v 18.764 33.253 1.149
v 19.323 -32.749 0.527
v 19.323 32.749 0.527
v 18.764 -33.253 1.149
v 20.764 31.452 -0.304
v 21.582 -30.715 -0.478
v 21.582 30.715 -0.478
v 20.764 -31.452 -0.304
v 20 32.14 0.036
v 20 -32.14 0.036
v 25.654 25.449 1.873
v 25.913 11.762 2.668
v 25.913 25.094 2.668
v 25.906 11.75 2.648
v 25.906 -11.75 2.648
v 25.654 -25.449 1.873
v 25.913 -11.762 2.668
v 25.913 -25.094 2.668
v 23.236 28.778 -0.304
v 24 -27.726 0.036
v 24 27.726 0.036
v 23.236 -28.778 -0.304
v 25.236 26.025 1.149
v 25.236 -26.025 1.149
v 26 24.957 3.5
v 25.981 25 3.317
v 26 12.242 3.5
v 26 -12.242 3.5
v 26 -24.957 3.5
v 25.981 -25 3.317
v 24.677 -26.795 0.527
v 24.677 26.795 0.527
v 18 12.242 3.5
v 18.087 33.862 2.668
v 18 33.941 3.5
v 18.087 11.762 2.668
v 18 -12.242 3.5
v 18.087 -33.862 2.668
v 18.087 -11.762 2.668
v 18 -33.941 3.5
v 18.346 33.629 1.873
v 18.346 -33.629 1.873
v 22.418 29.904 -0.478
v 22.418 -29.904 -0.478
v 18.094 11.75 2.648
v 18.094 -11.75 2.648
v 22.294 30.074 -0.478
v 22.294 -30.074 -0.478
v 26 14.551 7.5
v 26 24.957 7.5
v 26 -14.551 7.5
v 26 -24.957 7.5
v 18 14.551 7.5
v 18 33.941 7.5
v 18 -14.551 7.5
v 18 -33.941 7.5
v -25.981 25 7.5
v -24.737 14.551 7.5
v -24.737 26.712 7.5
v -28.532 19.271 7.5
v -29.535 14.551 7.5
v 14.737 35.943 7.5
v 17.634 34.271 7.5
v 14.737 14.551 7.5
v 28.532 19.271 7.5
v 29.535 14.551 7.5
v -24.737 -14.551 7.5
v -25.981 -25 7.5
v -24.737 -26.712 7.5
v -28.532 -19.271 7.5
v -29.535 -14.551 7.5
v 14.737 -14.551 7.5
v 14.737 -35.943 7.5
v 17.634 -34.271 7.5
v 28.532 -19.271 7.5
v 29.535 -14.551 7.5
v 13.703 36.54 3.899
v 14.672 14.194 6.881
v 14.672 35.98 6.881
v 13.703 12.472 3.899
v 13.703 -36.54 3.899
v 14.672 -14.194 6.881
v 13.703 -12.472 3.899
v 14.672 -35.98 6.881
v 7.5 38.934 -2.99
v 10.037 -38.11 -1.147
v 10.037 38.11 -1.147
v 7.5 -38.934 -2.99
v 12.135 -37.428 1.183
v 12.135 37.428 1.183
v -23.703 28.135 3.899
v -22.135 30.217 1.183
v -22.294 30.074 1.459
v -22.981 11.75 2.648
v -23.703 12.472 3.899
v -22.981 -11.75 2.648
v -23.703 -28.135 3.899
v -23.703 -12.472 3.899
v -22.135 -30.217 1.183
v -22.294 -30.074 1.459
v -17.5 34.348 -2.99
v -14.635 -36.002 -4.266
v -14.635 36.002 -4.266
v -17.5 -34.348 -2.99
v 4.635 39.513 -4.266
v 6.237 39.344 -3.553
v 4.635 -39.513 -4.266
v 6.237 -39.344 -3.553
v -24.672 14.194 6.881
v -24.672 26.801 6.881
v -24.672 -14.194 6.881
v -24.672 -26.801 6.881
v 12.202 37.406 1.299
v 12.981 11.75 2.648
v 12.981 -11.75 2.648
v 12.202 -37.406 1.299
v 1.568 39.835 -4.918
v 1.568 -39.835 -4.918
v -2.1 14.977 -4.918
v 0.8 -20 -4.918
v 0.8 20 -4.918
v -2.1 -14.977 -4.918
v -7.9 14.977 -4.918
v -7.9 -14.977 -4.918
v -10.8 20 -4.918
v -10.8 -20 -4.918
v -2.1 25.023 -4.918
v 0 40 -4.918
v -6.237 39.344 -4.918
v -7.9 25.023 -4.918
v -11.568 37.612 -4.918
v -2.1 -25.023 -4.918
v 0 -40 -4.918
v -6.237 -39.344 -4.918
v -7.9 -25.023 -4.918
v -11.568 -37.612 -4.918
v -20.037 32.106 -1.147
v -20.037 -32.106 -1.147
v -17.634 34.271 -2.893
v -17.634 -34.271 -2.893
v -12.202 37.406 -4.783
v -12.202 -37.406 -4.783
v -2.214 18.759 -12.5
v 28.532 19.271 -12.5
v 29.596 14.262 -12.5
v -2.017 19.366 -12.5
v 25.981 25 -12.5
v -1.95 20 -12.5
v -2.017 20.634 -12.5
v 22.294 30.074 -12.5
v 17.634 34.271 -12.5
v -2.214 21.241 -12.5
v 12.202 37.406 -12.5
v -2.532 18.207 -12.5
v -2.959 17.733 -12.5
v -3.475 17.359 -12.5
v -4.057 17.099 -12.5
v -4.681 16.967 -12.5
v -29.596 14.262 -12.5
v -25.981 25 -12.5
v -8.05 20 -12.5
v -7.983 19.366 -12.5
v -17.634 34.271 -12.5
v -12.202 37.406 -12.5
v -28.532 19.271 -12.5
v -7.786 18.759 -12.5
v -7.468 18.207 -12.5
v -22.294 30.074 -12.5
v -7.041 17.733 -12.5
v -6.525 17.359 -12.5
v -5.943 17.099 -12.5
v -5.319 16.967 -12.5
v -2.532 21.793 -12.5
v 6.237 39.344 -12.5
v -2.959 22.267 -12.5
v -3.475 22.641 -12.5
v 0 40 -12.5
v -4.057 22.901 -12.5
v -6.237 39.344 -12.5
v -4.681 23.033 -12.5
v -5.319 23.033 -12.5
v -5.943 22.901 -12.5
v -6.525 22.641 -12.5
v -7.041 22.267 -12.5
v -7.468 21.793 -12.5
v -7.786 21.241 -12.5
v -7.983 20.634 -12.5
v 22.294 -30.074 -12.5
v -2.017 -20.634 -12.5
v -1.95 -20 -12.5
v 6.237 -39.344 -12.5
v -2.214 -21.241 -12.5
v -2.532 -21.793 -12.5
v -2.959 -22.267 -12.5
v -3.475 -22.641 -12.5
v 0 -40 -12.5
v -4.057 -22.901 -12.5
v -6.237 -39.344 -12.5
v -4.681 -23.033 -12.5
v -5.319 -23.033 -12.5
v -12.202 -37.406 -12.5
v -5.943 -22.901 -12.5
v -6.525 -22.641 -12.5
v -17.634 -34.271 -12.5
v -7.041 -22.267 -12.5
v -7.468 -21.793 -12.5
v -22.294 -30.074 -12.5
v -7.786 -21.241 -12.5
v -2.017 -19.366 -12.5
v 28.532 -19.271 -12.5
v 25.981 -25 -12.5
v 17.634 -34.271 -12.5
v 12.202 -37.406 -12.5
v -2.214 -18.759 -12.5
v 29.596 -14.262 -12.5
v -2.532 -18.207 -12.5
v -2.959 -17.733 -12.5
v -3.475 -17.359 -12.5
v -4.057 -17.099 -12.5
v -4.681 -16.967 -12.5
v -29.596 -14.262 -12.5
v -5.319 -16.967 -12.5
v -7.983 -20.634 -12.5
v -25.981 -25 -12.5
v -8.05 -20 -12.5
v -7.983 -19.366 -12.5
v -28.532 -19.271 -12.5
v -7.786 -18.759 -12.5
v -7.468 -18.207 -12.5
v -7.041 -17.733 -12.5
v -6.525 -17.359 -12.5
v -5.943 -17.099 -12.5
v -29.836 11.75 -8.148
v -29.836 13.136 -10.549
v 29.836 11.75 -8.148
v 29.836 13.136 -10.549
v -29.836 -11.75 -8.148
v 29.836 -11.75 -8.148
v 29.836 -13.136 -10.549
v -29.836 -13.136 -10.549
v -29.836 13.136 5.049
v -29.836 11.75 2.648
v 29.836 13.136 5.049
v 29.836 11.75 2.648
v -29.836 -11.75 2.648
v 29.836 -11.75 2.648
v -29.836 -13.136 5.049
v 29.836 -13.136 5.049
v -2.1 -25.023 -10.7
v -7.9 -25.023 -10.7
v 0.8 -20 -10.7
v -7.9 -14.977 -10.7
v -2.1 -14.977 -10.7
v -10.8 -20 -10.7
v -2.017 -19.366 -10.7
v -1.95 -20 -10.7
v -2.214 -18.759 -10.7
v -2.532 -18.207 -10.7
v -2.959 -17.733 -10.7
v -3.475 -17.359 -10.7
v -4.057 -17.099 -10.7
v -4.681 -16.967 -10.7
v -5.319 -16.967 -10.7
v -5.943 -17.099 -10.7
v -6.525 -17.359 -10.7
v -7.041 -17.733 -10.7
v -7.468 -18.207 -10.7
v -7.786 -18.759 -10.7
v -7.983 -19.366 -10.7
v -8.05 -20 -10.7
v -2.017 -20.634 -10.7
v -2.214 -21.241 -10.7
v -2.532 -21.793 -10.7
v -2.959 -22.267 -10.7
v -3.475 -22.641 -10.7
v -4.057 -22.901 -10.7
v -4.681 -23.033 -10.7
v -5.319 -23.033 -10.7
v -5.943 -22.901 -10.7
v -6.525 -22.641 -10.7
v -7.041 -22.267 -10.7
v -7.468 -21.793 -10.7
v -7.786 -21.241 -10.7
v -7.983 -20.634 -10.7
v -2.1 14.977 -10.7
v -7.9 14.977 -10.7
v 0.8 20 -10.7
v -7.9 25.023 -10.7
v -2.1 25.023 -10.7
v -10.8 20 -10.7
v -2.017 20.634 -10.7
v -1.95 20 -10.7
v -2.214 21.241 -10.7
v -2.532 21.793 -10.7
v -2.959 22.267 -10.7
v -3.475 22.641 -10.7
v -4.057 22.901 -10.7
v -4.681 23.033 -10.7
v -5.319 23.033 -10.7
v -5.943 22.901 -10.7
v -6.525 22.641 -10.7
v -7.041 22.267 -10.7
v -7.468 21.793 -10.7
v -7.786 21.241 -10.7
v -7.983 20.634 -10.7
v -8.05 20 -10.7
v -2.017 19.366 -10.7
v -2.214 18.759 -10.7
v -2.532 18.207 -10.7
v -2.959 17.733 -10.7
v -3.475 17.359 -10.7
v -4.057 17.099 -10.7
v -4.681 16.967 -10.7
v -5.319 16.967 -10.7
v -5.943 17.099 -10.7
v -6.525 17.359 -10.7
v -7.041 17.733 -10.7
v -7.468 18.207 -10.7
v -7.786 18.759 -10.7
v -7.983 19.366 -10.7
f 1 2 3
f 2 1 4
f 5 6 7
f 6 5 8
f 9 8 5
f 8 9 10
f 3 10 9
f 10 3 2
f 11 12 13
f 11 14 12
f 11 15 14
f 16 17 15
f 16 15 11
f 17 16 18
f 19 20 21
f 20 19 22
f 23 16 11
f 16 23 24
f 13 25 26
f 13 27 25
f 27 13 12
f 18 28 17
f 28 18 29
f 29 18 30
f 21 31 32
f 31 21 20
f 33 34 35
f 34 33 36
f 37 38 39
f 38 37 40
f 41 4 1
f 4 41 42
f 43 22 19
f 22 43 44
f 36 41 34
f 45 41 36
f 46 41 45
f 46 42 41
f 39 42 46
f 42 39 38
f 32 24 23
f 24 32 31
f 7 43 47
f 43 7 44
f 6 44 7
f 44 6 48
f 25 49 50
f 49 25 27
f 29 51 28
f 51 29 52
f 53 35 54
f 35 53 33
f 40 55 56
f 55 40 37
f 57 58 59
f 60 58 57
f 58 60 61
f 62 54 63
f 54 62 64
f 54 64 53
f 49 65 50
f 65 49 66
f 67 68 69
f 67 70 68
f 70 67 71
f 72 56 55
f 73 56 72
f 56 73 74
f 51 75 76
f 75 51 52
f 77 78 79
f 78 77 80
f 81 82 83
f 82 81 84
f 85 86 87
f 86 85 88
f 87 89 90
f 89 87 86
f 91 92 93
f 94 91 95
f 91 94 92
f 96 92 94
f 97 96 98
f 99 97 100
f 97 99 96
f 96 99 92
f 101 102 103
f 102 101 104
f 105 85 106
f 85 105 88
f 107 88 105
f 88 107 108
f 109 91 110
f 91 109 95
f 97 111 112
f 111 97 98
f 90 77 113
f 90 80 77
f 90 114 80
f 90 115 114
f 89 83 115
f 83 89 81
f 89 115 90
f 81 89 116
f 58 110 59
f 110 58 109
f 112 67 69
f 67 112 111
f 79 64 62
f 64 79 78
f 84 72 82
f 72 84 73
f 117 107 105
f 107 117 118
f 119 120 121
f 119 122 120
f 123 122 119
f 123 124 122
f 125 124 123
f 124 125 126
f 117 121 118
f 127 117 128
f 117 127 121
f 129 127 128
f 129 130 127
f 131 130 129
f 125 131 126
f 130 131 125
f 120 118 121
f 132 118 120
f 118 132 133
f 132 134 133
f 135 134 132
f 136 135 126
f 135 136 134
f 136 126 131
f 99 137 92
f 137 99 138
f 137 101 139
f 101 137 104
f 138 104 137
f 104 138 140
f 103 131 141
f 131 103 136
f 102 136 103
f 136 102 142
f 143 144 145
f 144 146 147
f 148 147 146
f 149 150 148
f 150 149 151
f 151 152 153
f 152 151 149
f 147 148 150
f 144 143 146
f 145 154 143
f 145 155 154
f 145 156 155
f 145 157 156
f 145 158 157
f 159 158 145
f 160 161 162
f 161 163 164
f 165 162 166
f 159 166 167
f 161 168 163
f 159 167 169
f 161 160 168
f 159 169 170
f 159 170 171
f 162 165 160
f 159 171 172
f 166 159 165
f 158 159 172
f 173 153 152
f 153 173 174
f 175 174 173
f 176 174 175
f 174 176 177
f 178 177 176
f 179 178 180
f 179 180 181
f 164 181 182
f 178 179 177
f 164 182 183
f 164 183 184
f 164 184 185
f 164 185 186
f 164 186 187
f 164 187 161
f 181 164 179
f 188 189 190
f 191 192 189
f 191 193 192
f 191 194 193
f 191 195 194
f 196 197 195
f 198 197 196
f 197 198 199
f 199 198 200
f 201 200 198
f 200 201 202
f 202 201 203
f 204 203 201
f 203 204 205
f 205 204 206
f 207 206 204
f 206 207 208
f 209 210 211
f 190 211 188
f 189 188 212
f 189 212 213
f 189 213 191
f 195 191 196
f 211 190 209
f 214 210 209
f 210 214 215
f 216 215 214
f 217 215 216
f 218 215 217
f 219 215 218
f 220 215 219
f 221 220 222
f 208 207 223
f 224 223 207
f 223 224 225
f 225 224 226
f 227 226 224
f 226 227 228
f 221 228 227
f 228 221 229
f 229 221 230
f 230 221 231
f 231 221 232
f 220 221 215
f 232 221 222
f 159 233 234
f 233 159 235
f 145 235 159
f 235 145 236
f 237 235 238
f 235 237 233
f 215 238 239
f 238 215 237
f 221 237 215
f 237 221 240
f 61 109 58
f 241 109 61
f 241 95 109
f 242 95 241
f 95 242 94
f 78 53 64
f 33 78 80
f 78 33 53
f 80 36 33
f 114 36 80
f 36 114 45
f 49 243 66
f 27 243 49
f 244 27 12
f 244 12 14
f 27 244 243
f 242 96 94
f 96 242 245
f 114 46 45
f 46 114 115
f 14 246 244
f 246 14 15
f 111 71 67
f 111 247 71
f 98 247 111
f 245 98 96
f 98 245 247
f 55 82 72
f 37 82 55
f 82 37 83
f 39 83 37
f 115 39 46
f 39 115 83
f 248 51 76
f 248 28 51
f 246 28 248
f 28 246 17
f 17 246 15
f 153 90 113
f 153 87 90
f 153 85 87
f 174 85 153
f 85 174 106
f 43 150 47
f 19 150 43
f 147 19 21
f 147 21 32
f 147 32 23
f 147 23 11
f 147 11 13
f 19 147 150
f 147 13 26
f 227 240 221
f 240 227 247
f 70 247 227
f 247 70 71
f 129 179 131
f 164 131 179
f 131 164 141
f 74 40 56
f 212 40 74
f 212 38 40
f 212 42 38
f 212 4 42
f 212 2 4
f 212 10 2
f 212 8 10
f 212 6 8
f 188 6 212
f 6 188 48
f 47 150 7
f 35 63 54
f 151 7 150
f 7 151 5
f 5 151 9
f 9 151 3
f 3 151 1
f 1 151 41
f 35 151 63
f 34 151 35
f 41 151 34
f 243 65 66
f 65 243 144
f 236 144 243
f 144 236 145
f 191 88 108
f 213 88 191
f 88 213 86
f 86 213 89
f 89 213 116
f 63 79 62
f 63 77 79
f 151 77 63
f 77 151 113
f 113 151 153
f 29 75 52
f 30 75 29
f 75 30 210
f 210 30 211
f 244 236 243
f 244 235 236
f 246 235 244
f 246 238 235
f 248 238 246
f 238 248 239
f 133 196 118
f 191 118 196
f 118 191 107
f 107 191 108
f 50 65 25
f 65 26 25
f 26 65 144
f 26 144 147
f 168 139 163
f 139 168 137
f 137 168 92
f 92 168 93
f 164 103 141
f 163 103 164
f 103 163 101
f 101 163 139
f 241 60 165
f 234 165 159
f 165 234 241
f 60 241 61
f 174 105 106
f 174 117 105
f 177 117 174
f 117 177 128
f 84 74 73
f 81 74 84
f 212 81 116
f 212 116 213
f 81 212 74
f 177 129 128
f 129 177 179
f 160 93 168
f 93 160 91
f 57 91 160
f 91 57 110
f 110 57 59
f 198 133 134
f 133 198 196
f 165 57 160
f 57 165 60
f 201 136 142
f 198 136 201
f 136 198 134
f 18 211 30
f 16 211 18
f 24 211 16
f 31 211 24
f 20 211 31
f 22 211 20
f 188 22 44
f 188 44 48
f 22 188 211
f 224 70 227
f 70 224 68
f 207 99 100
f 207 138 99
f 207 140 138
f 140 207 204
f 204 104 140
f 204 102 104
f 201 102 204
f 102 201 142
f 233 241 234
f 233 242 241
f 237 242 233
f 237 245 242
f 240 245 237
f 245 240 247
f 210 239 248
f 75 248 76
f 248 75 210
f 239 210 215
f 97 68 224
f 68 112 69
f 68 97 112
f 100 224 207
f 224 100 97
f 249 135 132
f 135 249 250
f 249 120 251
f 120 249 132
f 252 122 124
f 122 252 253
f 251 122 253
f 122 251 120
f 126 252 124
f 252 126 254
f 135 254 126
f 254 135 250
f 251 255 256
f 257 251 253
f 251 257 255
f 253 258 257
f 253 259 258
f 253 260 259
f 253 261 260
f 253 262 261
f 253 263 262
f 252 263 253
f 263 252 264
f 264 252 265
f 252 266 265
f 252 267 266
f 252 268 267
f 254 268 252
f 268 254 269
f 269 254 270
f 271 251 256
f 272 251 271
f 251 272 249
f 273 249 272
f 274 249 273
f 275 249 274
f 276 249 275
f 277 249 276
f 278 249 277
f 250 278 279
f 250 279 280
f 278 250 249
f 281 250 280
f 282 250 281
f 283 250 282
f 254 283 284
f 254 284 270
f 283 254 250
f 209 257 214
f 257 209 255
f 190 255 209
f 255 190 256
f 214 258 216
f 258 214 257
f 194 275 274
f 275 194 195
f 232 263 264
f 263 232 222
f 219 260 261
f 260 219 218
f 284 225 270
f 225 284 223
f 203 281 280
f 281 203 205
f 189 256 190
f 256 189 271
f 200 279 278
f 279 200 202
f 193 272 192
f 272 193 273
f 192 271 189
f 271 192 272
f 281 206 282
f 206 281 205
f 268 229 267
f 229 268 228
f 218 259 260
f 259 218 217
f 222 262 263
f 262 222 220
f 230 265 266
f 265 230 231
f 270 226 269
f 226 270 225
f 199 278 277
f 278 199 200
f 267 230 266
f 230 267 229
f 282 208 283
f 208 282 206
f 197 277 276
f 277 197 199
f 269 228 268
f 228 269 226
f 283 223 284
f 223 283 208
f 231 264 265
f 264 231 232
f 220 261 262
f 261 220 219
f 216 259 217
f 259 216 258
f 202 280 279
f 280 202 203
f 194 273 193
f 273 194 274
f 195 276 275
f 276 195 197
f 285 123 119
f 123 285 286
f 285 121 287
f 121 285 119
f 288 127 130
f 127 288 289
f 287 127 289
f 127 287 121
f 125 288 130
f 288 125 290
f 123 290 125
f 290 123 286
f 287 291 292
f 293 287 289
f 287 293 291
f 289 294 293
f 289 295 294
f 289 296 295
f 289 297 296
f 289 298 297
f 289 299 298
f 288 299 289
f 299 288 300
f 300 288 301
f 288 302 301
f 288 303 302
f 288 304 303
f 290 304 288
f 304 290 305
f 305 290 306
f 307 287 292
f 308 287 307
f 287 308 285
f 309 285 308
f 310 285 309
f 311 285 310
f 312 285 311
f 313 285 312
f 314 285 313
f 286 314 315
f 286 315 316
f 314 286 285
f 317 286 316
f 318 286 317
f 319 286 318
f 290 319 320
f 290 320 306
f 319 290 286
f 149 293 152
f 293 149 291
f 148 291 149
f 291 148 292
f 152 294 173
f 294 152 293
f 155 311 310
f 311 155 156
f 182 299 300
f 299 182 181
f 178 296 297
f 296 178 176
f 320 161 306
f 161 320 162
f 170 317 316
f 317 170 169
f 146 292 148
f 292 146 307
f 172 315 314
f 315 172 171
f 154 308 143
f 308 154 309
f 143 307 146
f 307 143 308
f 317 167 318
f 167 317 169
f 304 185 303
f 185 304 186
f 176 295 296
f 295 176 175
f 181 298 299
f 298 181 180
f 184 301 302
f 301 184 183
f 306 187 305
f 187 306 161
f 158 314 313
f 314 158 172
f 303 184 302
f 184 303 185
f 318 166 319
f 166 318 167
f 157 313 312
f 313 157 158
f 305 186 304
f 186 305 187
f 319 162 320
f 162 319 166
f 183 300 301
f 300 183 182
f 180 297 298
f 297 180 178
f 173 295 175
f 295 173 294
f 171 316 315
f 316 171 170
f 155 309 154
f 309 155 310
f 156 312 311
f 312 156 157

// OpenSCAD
$fn = 30;

WIDTH = 60;
HEIGHT = 30;
LENGTH = 80;

HOLE_DIAMETER = 6.1;
HOLE_COUNT = 2;

BASE_HEIGHT = 5;

module nut() {
    nut_diameter = 11.2;
    nut_clear = 0.2;
    nut_height = 4.6 + 1.5;
    cylinder(r = nut_diameter / 2 + nut_clear, h = nut_height, $fn = 6);
}

module oblong(width = 40, height = HEIGHT, length = LENGTH * 2) {
    hull() {
        translate([-width / 2 + height / 2, 0, 0]) {
            cylinder(r = height / 2, h = length, center = true);
        }
        translate([width / 2 - height / 2, 0, 0]) {
            cylinder(r = height / 2, h = length, center = true);
        }
    }
}

module support() {
    width = WIDTH;
    height = HEIGHT / 2;
    base_height = BASE_HEIGHT;
    length = LENGTH;

    holder_diameter = 15;

    flag_support_diameter = 8;

    difference() {
        union() {
            translate([0, 0, -height / 2 - base_height / 2]) {
                cube(size = [width, length, base_height], center = true);
            }
            difference() {
                translate([0, 0, 0]) {
                    cube(size = [width, length, height], center = true);
                }
                translate([-5, 0, 10]) {
                    rotate([90, 0, 0]) {
                        oblong();
                    }
                }

                // Flag support
                translate([22, 0, height / 2]) {
                    translate([0, 0, - 4]) {
                        rotate([90, 0, 0]) {
                            cylinder(r = flag_support_diameter / 2, h = 100, center = true);
                        }
                    }
                    cube(size = [ flag_support_diameter, 100, flag_support_diameter ], center = true);
                }
            }
        }
        translate([-WIDTH, 0, -height / 2 - base_height / 2 - holder_diameter / 2 - 11]) {
            rotate([0, 90, 0]) {
                rotate([0, 0, 30]) {
                    cylinder(r = holder_diameter / 2 + 16, h = WIDTH * 2, $fn = 6);
                }
            }
        }

        translate([-WIDTH, 0, 23]) {
            rotate([0, 90, 0]) {
                rotate([0, 0, 30]) {
                    cylinder(r = holder_diameter / 2 + 16, h = WIDTH * 2, $fn = 6);
                }
            }
        }
    }
}

module main() {
    difference() {
        intersection() {
            support();
            rotate([0, 0, 90]){ 
                oblong(width=LENGTH, height=60, length=HEIGHT + BASE_HEIGHT);
            }
        }
        for (pos = [-LENGTH / 2 : LENGTH / HOLE_COUNT : LENGTH / 2]) {
            translate([-5, pos + (LENGTH / HOLE_COUNT) / 2, -10.7]) {
                nut();
                cylinder(r = HOLE_DIAMETER / 2, h = 15, center = true);
            }
            /*
            translate([0, pos + (LENGTH / HOLE_COUNT) / 2, -14]) {
                cylinder(r = HOLE_DIAMETER / 2, h = 15, center = true);
                translate([0, 0, 7.5]) {
                    cylinder(r = 10, h = 5, center = true);
                }
            }
            */
        }
    }
}

intersection() {
    translate([20, 10, 6]) {
        cube(size = [ 20, 20, 20], center = true);
    }
    main();
}

!main();

/*
!union() {
    main();
    %translate([0, 0, 5])
        cube(size = [100, 25, 1], center = true);
}
*/

//!support();
